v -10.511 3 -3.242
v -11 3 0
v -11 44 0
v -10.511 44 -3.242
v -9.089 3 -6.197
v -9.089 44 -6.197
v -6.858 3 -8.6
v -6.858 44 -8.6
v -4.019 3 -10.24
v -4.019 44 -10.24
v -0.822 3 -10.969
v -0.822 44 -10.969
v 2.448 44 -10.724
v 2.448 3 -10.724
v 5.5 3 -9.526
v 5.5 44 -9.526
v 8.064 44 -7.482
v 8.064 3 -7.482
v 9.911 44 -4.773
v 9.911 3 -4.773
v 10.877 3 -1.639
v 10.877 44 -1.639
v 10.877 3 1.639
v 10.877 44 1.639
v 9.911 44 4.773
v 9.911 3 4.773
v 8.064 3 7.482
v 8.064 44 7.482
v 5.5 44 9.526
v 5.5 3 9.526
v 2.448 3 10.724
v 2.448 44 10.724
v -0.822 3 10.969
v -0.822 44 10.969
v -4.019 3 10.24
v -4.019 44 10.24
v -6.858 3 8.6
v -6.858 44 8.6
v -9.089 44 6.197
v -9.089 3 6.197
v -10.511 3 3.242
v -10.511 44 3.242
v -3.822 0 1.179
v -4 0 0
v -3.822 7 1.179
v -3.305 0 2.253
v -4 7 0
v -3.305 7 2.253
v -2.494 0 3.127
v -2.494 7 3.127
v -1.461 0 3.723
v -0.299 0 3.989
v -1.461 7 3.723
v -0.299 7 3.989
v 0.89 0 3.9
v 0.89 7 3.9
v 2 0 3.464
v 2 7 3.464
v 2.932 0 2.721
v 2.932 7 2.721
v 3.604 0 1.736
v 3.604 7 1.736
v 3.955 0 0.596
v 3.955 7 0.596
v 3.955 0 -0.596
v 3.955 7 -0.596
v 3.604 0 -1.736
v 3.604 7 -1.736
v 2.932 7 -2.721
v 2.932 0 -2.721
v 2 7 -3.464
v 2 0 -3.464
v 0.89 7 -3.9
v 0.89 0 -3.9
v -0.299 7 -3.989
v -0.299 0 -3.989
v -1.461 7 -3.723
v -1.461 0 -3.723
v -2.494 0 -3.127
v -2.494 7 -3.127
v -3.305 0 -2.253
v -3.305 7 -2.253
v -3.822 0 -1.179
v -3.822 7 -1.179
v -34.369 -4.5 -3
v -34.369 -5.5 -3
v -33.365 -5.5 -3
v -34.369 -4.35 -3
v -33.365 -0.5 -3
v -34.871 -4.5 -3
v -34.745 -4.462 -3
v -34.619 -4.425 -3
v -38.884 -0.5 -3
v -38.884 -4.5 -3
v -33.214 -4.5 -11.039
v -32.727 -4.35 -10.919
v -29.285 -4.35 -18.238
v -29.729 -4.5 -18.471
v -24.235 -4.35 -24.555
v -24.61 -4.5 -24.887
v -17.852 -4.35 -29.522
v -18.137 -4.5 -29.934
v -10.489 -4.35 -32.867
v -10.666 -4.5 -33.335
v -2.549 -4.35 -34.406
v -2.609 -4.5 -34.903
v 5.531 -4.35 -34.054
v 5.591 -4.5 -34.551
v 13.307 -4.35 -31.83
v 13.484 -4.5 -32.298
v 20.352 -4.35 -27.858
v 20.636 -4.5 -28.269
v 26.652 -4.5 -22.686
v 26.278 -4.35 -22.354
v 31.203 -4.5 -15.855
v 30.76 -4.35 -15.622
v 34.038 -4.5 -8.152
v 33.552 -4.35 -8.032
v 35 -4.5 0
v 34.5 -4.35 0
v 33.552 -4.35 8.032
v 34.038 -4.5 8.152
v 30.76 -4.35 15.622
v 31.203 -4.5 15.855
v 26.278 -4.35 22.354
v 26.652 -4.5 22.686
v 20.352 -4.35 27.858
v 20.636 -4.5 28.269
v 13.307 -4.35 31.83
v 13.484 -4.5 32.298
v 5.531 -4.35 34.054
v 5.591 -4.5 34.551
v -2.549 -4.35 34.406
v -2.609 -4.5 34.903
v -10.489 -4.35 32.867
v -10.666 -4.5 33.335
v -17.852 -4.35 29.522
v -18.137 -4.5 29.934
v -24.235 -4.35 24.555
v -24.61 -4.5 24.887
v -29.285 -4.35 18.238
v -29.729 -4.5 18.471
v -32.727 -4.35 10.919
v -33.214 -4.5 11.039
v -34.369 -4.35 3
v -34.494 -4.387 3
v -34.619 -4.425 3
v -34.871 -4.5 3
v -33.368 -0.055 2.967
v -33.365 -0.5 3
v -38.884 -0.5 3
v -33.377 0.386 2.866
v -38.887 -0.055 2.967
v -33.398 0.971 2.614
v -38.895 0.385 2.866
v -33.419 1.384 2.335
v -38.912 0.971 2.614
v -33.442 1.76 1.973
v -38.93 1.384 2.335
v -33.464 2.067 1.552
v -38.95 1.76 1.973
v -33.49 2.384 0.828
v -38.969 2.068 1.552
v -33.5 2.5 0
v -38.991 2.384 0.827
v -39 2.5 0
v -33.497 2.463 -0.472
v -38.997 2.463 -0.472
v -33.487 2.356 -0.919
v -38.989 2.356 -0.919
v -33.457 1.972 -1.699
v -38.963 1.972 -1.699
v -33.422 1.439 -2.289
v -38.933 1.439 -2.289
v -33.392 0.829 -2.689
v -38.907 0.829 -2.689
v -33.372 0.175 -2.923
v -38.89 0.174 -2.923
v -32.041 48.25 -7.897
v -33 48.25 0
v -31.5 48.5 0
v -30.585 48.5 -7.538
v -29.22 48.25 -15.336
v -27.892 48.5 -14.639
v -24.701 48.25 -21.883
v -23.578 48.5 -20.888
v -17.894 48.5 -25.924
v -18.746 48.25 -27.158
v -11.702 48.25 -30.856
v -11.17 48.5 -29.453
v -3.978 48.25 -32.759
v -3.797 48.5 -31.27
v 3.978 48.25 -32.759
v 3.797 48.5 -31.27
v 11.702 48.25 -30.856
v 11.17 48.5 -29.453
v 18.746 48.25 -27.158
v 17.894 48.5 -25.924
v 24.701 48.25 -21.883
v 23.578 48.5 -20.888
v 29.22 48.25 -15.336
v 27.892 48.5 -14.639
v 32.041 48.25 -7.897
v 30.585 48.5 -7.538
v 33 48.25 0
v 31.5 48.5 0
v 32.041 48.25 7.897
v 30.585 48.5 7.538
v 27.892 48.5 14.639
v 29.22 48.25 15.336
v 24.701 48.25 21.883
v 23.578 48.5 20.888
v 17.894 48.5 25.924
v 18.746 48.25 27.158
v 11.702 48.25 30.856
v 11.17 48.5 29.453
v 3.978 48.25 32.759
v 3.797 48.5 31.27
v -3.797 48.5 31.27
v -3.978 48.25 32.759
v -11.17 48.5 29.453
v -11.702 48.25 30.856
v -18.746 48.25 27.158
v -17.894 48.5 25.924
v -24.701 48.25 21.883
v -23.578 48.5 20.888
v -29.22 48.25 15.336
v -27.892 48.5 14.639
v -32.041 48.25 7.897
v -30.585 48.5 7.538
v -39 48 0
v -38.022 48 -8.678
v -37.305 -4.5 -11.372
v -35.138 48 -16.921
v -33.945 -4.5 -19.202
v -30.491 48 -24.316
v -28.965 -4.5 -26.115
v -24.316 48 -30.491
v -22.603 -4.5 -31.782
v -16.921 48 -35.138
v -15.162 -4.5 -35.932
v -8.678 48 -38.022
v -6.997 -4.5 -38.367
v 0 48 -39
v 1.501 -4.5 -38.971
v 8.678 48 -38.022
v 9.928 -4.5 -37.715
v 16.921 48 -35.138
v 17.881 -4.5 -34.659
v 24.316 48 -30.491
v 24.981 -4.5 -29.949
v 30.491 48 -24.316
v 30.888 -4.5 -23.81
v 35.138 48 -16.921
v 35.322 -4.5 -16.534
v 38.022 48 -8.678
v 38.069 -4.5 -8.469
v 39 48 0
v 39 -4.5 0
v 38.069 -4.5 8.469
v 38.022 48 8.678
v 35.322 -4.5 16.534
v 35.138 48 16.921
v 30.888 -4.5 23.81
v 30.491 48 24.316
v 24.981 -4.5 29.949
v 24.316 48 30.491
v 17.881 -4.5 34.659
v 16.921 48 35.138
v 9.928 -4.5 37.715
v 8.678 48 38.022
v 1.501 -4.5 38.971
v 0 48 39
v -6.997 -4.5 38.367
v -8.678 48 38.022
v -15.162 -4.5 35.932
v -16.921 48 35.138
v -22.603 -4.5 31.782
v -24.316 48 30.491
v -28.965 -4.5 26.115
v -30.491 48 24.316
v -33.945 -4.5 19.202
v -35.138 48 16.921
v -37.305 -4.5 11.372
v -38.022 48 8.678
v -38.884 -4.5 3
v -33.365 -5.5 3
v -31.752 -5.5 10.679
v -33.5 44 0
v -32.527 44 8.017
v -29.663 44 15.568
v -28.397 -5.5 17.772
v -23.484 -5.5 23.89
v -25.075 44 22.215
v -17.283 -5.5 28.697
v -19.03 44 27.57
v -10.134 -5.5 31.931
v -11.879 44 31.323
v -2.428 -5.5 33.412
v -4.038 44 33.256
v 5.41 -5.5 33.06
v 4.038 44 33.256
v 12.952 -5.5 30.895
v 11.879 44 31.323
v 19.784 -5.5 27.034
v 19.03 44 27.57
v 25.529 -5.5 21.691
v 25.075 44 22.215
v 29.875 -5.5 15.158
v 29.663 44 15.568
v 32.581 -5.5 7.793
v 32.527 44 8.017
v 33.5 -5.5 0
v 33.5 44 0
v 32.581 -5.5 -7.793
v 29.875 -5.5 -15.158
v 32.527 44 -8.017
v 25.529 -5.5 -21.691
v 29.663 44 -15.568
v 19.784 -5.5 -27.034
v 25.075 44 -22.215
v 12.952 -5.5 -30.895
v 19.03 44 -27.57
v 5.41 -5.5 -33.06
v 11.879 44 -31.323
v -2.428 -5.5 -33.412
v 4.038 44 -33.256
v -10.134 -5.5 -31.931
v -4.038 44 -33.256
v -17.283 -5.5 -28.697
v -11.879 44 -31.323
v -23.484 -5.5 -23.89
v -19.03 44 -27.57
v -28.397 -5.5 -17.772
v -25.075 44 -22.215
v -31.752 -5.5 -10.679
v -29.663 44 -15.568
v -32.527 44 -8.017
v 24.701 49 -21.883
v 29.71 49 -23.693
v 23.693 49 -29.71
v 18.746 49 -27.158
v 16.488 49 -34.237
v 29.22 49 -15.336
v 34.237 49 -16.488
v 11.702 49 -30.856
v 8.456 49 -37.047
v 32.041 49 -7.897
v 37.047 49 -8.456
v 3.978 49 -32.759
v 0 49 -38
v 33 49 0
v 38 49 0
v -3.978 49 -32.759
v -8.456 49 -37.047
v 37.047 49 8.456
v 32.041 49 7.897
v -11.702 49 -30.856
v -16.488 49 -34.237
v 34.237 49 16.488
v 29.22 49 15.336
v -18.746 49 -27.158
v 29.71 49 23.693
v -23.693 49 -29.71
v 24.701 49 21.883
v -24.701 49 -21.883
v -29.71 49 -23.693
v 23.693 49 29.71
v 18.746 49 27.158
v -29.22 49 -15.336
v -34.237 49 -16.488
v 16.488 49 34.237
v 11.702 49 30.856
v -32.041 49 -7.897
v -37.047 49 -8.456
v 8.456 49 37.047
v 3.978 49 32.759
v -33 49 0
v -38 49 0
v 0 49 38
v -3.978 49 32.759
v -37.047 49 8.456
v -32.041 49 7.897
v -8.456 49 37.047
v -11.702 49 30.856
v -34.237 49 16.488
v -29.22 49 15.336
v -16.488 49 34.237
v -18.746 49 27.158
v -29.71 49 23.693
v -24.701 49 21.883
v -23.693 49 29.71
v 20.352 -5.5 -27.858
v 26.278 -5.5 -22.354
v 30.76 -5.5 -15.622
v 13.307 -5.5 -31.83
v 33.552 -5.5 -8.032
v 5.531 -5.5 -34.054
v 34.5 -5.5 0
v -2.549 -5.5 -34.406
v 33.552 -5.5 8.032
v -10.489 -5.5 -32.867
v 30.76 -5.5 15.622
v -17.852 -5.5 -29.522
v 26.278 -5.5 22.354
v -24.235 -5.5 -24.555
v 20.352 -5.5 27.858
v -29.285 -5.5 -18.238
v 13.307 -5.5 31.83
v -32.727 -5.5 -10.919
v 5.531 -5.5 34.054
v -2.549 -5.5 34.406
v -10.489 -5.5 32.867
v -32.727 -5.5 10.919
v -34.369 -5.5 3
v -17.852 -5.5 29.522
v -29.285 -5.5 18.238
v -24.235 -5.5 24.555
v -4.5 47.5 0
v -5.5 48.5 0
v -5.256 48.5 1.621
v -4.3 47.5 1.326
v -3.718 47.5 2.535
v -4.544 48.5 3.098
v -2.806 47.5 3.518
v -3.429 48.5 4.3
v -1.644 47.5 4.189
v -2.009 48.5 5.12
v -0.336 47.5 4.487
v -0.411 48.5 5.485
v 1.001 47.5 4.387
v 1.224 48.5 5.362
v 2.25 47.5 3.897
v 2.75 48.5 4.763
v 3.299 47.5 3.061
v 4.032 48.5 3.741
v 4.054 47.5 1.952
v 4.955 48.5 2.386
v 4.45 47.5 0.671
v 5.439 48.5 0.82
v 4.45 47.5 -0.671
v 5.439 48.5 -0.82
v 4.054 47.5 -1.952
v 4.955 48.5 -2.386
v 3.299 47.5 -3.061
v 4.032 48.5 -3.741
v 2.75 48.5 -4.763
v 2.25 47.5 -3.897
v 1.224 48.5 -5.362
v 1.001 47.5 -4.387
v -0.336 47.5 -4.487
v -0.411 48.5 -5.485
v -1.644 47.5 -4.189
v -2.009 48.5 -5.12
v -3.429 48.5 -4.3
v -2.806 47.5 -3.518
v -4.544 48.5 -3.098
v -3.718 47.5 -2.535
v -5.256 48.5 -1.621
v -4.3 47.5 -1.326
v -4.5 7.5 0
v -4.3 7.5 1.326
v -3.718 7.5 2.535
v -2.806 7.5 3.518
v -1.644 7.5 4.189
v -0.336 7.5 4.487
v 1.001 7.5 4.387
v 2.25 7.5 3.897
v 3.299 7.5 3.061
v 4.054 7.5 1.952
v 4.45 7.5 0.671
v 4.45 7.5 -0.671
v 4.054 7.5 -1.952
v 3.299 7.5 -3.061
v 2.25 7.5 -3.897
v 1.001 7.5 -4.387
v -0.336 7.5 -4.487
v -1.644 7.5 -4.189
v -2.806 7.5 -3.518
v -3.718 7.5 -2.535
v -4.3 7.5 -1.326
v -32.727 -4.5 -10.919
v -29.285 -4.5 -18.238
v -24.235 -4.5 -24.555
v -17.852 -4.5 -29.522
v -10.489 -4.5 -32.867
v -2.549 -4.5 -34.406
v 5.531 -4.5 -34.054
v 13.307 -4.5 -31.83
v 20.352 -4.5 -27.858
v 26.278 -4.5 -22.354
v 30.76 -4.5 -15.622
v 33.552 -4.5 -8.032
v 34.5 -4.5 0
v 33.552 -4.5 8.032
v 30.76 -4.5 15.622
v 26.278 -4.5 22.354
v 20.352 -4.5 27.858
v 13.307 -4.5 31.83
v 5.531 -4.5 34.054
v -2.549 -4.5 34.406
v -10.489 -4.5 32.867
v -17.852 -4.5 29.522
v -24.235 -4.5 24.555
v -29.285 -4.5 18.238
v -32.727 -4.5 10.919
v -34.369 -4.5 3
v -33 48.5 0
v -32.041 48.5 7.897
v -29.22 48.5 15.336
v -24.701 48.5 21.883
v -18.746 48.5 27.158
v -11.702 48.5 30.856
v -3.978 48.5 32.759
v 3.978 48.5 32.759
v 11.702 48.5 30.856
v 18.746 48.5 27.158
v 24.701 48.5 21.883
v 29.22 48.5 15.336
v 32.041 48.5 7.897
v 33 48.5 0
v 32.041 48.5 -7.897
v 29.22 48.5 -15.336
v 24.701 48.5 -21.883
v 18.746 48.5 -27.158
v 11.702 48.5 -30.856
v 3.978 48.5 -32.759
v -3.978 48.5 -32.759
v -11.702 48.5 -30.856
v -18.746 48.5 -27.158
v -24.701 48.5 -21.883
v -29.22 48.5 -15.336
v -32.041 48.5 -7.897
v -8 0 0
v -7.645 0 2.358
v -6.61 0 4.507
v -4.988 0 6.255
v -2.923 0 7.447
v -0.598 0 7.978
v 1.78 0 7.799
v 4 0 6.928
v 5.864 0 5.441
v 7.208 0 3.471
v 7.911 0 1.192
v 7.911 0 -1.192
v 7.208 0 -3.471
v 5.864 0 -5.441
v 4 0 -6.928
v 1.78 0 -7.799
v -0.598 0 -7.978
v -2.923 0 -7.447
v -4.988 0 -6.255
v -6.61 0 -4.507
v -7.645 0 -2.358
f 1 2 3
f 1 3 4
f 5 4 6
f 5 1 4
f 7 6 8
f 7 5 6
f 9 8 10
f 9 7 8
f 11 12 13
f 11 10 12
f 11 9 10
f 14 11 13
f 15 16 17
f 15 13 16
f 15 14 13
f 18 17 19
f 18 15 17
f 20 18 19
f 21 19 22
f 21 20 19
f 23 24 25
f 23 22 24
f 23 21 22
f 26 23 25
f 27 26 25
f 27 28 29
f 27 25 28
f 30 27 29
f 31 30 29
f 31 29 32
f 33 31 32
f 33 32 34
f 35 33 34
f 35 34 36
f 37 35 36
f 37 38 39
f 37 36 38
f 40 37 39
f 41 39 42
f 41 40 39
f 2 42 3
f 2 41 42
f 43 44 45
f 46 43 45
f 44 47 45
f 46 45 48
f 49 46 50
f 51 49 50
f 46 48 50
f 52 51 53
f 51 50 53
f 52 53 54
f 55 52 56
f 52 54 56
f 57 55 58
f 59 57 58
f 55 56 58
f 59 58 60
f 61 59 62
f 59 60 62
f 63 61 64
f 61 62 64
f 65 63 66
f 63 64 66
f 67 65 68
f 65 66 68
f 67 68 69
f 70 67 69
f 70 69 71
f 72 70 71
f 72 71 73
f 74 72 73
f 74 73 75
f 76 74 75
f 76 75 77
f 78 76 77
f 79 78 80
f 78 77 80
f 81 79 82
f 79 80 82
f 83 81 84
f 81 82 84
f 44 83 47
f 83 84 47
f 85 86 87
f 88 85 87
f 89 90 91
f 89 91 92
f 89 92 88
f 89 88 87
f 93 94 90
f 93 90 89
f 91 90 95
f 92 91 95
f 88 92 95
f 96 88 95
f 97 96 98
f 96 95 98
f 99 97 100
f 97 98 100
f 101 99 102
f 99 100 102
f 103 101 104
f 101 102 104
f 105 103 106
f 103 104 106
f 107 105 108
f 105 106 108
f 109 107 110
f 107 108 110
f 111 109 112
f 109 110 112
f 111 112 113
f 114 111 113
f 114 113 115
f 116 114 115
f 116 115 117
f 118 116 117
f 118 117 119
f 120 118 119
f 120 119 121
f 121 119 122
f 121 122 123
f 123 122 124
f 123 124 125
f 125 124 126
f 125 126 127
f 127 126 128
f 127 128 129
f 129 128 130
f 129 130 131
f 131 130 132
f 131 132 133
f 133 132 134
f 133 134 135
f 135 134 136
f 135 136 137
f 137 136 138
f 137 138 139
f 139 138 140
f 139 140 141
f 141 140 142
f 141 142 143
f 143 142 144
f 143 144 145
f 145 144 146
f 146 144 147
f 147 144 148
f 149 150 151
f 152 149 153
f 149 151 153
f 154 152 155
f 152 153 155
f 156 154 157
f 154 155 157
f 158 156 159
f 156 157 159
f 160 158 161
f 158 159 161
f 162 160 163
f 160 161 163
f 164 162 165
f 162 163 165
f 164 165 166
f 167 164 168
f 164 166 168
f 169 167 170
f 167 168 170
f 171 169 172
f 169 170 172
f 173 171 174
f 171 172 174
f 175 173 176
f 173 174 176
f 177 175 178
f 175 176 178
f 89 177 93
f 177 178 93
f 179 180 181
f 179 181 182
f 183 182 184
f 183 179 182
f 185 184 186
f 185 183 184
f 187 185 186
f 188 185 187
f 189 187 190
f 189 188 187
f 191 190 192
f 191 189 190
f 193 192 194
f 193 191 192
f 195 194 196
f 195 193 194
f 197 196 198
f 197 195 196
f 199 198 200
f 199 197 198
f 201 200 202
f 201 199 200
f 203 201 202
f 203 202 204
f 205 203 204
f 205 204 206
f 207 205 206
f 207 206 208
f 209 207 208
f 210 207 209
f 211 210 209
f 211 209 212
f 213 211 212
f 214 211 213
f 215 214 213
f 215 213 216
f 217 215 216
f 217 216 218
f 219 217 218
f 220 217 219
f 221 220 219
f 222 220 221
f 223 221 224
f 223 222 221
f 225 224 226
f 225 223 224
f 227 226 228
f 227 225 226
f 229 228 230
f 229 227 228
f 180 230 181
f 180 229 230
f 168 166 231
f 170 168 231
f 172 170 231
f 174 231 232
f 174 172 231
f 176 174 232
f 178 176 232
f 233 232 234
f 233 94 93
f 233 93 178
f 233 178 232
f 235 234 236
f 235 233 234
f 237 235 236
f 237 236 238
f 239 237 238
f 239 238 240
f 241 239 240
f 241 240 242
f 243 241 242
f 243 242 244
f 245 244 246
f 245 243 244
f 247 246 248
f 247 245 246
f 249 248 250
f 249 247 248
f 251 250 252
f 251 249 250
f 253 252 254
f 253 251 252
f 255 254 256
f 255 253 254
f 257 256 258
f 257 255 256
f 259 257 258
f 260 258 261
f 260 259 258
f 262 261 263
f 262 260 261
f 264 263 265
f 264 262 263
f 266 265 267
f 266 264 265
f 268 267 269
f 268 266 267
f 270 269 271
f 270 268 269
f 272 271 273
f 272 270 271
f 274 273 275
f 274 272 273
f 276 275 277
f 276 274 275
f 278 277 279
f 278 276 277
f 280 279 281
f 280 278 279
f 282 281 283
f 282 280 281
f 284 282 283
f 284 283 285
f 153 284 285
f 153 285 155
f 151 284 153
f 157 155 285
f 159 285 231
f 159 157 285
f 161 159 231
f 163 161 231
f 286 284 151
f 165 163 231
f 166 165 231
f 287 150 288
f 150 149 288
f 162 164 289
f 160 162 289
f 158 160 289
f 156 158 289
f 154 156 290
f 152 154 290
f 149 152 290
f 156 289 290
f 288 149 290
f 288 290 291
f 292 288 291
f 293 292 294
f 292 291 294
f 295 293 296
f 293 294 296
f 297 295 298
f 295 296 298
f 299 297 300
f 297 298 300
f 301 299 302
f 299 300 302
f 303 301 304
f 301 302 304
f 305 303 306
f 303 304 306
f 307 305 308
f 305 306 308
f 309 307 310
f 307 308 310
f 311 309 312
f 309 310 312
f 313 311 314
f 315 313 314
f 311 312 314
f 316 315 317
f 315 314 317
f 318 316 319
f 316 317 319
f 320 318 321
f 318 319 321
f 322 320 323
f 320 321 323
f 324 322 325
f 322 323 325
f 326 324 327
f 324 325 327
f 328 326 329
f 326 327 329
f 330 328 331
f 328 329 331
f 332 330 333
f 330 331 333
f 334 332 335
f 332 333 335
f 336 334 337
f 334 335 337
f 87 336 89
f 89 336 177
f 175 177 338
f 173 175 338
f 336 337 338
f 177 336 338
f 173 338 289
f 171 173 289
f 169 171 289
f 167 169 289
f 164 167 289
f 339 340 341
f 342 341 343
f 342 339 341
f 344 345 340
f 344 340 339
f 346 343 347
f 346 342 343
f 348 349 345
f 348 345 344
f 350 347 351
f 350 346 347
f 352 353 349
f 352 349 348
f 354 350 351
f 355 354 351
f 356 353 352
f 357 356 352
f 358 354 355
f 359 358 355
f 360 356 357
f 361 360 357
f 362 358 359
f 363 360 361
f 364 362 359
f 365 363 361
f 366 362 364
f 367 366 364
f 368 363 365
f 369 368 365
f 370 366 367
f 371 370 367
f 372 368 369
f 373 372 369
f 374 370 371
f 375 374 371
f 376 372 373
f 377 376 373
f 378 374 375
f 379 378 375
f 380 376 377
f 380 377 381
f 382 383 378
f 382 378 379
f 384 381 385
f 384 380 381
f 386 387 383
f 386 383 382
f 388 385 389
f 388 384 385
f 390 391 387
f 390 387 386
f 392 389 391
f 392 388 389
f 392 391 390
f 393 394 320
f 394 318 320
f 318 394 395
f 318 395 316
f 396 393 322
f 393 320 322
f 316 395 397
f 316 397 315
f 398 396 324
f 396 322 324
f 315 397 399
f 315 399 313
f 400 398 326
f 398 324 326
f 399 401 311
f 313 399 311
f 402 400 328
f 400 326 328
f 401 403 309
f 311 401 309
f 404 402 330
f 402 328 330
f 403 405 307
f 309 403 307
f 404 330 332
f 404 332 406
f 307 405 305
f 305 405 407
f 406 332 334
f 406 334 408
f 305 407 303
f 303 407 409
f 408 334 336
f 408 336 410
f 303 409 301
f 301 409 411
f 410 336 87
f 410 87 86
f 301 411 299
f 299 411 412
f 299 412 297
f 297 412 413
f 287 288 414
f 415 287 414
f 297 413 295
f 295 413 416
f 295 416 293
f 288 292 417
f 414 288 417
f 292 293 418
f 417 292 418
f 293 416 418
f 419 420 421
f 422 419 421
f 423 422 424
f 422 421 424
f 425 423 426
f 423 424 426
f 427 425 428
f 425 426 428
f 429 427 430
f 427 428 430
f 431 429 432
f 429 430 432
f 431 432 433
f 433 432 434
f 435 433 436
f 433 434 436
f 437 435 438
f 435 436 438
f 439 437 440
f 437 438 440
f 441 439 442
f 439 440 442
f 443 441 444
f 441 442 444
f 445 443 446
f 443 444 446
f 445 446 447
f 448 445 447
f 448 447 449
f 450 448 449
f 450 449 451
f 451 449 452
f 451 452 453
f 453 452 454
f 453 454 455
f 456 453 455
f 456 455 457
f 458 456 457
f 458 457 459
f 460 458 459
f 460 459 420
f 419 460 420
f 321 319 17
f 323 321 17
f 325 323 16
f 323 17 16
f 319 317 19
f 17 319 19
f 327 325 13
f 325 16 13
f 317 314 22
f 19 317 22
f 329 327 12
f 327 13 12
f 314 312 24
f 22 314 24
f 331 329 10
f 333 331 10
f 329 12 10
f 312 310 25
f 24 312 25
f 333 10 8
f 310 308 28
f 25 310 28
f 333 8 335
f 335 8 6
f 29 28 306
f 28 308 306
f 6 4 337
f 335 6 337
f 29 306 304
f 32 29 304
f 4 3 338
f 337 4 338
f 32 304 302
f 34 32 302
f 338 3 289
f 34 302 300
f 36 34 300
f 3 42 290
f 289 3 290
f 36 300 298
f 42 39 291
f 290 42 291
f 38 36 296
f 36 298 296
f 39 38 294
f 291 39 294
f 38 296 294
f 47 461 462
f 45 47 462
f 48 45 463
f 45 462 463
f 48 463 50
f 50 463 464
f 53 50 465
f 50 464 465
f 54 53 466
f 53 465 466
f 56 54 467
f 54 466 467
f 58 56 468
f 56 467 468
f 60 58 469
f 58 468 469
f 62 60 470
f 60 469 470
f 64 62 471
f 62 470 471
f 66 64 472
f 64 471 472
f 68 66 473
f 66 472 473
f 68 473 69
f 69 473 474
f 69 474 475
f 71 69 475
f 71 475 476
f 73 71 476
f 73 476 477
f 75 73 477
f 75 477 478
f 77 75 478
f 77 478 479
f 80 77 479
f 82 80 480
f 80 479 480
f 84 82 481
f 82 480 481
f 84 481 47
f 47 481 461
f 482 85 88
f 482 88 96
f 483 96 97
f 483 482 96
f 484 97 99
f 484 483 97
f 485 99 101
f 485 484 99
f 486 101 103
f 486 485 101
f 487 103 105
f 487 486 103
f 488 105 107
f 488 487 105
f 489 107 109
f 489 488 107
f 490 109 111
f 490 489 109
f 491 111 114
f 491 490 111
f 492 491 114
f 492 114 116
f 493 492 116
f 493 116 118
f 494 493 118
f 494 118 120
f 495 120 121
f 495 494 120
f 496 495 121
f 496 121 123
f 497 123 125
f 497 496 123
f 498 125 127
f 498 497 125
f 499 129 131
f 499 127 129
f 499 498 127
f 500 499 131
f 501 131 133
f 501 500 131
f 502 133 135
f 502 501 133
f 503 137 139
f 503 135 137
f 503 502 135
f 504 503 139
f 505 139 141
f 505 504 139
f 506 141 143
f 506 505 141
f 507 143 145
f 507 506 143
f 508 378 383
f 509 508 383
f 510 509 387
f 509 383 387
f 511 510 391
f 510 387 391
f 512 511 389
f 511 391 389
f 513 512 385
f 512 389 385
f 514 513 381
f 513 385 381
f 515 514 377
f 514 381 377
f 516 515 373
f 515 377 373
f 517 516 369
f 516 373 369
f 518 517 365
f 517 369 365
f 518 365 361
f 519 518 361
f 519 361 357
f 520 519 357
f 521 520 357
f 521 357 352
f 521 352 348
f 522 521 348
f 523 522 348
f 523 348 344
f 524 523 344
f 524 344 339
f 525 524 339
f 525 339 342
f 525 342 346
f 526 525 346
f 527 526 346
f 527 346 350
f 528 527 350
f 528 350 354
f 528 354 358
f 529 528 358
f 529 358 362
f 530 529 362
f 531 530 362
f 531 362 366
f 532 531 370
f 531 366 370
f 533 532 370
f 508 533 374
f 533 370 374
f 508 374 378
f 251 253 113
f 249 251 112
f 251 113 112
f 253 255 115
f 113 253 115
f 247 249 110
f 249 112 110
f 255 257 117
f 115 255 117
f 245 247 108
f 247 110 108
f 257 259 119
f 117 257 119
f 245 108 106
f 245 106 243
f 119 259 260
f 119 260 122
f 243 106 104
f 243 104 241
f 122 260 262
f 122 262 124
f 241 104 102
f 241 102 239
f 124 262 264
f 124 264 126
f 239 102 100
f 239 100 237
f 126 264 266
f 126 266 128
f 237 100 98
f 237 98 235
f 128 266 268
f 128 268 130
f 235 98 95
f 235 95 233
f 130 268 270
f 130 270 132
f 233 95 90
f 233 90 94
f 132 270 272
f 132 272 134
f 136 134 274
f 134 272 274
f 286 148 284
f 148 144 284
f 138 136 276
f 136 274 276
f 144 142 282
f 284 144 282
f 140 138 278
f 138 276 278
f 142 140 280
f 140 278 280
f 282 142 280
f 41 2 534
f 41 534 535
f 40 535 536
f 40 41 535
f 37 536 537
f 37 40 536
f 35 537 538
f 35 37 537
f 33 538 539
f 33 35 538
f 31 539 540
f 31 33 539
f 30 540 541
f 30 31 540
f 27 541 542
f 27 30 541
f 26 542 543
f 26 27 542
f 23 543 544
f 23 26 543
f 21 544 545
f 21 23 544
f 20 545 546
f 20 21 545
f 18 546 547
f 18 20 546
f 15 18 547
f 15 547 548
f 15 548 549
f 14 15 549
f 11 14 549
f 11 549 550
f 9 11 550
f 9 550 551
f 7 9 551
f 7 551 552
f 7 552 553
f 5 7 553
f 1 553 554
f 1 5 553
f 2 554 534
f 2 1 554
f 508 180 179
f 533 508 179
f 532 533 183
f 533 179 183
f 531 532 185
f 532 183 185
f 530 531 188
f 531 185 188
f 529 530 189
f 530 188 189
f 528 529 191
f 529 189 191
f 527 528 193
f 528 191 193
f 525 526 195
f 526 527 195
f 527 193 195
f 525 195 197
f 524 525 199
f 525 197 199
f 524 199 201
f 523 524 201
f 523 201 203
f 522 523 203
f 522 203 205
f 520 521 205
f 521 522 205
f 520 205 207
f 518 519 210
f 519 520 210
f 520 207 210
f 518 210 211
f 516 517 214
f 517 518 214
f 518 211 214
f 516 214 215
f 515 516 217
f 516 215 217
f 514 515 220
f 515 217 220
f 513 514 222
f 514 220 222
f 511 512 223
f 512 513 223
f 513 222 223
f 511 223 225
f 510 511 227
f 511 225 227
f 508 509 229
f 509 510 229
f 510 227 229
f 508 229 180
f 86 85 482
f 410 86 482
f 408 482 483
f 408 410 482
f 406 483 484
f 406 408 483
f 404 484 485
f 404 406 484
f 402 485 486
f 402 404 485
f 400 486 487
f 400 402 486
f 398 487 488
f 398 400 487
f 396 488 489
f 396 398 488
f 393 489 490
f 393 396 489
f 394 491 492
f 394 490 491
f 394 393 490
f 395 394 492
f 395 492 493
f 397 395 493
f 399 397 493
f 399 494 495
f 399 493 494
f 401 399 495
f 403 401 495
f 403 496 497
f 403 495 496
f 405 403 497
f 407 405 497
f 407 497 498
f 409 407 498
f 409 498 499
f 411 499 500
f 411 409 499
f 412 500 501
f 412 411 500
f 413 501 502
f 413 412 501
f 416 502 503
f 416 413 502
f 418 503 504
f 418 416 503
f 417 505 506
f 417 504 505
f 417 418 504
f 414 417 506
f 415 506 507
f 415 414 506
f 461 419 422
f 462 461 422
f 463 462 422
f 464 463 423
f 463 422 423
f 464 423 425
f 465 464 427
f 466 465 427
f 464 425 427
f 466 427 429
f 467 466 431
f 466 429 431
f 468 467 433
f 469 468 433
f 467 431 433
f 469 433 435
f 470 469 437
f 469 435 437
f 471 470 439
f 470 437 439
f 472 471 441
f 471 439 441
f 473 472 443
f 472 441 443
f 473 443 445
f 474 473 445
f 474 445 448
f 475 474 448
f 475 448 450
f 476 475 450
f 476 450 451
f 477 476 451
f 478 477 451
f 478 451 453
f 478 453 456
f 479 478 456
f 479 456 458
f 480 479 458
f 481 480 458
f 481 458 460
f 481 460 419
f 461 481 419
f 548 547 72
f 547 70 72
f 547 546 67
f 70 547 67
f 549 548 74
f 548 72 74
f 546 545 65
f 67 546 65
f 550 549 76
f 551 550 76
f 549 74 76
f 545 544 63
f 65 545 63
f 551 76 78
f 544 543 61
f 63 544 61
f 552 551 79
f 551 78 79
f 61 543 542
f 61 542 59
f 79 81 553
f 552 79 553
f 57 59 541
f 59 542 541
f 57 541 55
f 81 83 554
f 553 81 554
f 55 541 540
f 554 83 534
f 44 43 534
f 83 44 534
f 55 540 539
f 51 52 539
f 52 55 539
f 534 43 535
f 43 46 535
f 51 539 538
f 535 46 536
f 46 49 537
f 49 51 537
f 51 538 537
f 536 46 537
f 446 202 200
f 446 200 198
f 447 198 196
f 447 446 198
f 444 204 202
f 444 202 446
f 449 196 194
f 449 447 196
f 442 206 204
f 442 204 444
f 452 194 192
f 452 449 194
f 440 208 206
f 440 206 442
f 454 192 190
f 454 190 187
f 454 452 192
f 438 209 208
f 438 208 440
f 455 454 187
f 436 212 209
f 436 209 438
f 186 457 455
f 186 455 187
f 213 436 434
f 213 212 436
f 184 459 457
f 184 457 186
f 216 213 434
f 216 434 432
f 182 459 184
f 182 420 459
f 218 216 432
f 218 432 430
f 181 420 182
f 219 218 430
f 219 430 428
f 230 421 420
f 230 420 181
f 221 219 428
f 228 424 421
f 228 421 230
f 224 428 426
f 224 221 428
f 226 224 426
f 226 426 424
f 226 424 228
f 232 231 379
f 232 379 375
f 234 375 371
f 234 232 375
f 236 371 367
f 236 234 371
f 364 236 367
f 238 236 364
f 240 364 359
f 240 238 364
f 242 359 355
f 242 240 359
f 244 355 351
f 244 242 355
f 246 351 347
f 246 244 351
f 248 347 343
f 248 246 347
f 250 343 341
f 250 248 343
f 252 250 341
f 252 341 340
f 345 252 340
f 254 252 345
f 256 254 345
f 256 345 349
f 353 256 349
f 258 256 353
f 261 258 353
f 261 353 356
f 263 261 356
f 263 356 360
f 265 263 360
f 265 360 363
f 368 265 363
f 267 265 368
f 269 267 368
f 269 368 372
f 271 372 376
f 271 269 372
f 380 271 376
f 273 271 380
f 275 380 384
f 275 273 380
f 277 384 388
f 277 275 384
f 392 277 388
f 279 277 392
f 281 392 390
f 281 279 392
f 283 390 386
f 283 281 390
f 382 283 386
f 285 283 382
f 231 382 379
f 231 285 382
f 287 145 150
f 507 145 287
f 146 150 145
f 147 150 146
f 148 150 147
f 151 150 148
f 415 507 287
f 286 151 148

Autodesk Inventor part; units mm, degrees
ref_plane "XZ Plane" through (0, 0, 0) normal (0, 1, 0) x (-1, 0, 0)
ref_plane "XY Plane" through (0, 0, 0) normal (0, 0, 1) x (1, 0, 0)
sketch "Sketch1" plane through (0, 0, 0) normal (0, 0, 1) x (1, 0, 0)
  line L0 (-4, 0) -> (-4, 7)
  line L1 (-4, 7) -> (-4.5, 7.5)
  line L2 (-4.5, 7.5) -> (-4.5, 48.5)
  line L3 (-4.5, 48.5) -> (-33, 48.5)
  line L4 (-33, 48.5) -> (-33, 49)
  line L5 (-33, 49) -> (-39, 49)
  line L6 (-33.5, 44) -> (-11, 44)
  line L7 (-11, 44) -> (-11, 3)
  line L8 (-11, 3) -> (-8, 0)
  line L9 (-8, 0) -> (-4, 0)
  line L10 (0, 0) -> (0, 13.1371)
  line L11 (-39, 49) -> (-39, -4.5)
  line L12 (-39, -4.5) -> (-34.5, -4.5)
  line L13 (-34.5, -4.5) -> (-34.5, -5.5)
  line L14 (-34.5, -5.5) -> (-33.5, -5.5)
  line L15 (-33.5, -5.5) -> (-33.5, 44)
  line L16 (-33, 48.5) -> (-33, 48.25)
  line L17 (-33, 48.25) -> (-31.5, 48.5)
  line L18 (-35, -4.5) -> (-34.5, -4.35)
  line L19 (-34.5, -4.35) -> (-34.5, -4.5)
  dimension "d0" = 8
  dimension "d1" = 7
  dimension "d7" = 135
  dimension "d9" = 135
  dimension "d11" = 4.5
  dimension "d12" = 9
  dimension "d13" = 16
  dimension "d14" = 22
  dimension "d15" = 0.5
  dimension "d19" = 44
  dimension "d20" = 66
  dimension "d27" = 6.5
  dimension "d28" = 49
  dimension "d29" = 5
  dimension "d31" = 67
  dimension "d32" = 4.5
  dimension "d34" = 1
  dimension "d35" = 0.25
  dimension "d36" = 1.5
  dimension "d37" = 78
  dimension "d38" = 5.5
  dimension "d39" = 0.15
  dimension "d40" = 0.5
  dimension "d41" = 4.5
revolve "Revolution1" add sketch "Sketch1" angle 360 about axis through (0, 0, 0) along (0, 1, 0) contours L9 L8 L7 L6 L15 L14 L13 L19 L18 L12 L11 L5 L4 L16 L17 L3 L2 L1 L0
chamfer "Chamfer1" distance 1 angle 45 1 edges at (4.5, 48.5, 0)
ref_plane "Work Plane1" through (-39, 22.25, 0) normal (1, 0, 0) x (0, 1, 0)
sketch "Sketch2" plane through (-39, 22.25, 0) normal (1, 0, 0) x (0, 1, 0)
  line L0 (-22.75, 0) -> (-37.8891, 0) construction
  line L1 (-22.75, 3) -> (-37.8891, 3)
  line L2 (-37.8891, -3) -> (-22.75, -3)
  arc A0 (-22.75, -3) -> (-22.75, 3) centre (-22.75, 0) ccw
  arc A1 (-37.8891, 3) -> (-37.8891, -3) centre (-37.8891, 0) ccw
  line L3 (-27.75, -34.5) -> (-27.75, 34.5) projected
  point P0 (-22.25, 0)
  point P1 (-30.3196, 0)
  dimension "d42" = 6
  dimension "d43" = 5
extrude "Extrusion1" cut sketch "Sketch2" along normal blind 10
chamfer "Chamfer2" distance 1 angle 45 1 edges at (39, 49, 0)
properties part number "010" material "Stainless Steel, 440C"
